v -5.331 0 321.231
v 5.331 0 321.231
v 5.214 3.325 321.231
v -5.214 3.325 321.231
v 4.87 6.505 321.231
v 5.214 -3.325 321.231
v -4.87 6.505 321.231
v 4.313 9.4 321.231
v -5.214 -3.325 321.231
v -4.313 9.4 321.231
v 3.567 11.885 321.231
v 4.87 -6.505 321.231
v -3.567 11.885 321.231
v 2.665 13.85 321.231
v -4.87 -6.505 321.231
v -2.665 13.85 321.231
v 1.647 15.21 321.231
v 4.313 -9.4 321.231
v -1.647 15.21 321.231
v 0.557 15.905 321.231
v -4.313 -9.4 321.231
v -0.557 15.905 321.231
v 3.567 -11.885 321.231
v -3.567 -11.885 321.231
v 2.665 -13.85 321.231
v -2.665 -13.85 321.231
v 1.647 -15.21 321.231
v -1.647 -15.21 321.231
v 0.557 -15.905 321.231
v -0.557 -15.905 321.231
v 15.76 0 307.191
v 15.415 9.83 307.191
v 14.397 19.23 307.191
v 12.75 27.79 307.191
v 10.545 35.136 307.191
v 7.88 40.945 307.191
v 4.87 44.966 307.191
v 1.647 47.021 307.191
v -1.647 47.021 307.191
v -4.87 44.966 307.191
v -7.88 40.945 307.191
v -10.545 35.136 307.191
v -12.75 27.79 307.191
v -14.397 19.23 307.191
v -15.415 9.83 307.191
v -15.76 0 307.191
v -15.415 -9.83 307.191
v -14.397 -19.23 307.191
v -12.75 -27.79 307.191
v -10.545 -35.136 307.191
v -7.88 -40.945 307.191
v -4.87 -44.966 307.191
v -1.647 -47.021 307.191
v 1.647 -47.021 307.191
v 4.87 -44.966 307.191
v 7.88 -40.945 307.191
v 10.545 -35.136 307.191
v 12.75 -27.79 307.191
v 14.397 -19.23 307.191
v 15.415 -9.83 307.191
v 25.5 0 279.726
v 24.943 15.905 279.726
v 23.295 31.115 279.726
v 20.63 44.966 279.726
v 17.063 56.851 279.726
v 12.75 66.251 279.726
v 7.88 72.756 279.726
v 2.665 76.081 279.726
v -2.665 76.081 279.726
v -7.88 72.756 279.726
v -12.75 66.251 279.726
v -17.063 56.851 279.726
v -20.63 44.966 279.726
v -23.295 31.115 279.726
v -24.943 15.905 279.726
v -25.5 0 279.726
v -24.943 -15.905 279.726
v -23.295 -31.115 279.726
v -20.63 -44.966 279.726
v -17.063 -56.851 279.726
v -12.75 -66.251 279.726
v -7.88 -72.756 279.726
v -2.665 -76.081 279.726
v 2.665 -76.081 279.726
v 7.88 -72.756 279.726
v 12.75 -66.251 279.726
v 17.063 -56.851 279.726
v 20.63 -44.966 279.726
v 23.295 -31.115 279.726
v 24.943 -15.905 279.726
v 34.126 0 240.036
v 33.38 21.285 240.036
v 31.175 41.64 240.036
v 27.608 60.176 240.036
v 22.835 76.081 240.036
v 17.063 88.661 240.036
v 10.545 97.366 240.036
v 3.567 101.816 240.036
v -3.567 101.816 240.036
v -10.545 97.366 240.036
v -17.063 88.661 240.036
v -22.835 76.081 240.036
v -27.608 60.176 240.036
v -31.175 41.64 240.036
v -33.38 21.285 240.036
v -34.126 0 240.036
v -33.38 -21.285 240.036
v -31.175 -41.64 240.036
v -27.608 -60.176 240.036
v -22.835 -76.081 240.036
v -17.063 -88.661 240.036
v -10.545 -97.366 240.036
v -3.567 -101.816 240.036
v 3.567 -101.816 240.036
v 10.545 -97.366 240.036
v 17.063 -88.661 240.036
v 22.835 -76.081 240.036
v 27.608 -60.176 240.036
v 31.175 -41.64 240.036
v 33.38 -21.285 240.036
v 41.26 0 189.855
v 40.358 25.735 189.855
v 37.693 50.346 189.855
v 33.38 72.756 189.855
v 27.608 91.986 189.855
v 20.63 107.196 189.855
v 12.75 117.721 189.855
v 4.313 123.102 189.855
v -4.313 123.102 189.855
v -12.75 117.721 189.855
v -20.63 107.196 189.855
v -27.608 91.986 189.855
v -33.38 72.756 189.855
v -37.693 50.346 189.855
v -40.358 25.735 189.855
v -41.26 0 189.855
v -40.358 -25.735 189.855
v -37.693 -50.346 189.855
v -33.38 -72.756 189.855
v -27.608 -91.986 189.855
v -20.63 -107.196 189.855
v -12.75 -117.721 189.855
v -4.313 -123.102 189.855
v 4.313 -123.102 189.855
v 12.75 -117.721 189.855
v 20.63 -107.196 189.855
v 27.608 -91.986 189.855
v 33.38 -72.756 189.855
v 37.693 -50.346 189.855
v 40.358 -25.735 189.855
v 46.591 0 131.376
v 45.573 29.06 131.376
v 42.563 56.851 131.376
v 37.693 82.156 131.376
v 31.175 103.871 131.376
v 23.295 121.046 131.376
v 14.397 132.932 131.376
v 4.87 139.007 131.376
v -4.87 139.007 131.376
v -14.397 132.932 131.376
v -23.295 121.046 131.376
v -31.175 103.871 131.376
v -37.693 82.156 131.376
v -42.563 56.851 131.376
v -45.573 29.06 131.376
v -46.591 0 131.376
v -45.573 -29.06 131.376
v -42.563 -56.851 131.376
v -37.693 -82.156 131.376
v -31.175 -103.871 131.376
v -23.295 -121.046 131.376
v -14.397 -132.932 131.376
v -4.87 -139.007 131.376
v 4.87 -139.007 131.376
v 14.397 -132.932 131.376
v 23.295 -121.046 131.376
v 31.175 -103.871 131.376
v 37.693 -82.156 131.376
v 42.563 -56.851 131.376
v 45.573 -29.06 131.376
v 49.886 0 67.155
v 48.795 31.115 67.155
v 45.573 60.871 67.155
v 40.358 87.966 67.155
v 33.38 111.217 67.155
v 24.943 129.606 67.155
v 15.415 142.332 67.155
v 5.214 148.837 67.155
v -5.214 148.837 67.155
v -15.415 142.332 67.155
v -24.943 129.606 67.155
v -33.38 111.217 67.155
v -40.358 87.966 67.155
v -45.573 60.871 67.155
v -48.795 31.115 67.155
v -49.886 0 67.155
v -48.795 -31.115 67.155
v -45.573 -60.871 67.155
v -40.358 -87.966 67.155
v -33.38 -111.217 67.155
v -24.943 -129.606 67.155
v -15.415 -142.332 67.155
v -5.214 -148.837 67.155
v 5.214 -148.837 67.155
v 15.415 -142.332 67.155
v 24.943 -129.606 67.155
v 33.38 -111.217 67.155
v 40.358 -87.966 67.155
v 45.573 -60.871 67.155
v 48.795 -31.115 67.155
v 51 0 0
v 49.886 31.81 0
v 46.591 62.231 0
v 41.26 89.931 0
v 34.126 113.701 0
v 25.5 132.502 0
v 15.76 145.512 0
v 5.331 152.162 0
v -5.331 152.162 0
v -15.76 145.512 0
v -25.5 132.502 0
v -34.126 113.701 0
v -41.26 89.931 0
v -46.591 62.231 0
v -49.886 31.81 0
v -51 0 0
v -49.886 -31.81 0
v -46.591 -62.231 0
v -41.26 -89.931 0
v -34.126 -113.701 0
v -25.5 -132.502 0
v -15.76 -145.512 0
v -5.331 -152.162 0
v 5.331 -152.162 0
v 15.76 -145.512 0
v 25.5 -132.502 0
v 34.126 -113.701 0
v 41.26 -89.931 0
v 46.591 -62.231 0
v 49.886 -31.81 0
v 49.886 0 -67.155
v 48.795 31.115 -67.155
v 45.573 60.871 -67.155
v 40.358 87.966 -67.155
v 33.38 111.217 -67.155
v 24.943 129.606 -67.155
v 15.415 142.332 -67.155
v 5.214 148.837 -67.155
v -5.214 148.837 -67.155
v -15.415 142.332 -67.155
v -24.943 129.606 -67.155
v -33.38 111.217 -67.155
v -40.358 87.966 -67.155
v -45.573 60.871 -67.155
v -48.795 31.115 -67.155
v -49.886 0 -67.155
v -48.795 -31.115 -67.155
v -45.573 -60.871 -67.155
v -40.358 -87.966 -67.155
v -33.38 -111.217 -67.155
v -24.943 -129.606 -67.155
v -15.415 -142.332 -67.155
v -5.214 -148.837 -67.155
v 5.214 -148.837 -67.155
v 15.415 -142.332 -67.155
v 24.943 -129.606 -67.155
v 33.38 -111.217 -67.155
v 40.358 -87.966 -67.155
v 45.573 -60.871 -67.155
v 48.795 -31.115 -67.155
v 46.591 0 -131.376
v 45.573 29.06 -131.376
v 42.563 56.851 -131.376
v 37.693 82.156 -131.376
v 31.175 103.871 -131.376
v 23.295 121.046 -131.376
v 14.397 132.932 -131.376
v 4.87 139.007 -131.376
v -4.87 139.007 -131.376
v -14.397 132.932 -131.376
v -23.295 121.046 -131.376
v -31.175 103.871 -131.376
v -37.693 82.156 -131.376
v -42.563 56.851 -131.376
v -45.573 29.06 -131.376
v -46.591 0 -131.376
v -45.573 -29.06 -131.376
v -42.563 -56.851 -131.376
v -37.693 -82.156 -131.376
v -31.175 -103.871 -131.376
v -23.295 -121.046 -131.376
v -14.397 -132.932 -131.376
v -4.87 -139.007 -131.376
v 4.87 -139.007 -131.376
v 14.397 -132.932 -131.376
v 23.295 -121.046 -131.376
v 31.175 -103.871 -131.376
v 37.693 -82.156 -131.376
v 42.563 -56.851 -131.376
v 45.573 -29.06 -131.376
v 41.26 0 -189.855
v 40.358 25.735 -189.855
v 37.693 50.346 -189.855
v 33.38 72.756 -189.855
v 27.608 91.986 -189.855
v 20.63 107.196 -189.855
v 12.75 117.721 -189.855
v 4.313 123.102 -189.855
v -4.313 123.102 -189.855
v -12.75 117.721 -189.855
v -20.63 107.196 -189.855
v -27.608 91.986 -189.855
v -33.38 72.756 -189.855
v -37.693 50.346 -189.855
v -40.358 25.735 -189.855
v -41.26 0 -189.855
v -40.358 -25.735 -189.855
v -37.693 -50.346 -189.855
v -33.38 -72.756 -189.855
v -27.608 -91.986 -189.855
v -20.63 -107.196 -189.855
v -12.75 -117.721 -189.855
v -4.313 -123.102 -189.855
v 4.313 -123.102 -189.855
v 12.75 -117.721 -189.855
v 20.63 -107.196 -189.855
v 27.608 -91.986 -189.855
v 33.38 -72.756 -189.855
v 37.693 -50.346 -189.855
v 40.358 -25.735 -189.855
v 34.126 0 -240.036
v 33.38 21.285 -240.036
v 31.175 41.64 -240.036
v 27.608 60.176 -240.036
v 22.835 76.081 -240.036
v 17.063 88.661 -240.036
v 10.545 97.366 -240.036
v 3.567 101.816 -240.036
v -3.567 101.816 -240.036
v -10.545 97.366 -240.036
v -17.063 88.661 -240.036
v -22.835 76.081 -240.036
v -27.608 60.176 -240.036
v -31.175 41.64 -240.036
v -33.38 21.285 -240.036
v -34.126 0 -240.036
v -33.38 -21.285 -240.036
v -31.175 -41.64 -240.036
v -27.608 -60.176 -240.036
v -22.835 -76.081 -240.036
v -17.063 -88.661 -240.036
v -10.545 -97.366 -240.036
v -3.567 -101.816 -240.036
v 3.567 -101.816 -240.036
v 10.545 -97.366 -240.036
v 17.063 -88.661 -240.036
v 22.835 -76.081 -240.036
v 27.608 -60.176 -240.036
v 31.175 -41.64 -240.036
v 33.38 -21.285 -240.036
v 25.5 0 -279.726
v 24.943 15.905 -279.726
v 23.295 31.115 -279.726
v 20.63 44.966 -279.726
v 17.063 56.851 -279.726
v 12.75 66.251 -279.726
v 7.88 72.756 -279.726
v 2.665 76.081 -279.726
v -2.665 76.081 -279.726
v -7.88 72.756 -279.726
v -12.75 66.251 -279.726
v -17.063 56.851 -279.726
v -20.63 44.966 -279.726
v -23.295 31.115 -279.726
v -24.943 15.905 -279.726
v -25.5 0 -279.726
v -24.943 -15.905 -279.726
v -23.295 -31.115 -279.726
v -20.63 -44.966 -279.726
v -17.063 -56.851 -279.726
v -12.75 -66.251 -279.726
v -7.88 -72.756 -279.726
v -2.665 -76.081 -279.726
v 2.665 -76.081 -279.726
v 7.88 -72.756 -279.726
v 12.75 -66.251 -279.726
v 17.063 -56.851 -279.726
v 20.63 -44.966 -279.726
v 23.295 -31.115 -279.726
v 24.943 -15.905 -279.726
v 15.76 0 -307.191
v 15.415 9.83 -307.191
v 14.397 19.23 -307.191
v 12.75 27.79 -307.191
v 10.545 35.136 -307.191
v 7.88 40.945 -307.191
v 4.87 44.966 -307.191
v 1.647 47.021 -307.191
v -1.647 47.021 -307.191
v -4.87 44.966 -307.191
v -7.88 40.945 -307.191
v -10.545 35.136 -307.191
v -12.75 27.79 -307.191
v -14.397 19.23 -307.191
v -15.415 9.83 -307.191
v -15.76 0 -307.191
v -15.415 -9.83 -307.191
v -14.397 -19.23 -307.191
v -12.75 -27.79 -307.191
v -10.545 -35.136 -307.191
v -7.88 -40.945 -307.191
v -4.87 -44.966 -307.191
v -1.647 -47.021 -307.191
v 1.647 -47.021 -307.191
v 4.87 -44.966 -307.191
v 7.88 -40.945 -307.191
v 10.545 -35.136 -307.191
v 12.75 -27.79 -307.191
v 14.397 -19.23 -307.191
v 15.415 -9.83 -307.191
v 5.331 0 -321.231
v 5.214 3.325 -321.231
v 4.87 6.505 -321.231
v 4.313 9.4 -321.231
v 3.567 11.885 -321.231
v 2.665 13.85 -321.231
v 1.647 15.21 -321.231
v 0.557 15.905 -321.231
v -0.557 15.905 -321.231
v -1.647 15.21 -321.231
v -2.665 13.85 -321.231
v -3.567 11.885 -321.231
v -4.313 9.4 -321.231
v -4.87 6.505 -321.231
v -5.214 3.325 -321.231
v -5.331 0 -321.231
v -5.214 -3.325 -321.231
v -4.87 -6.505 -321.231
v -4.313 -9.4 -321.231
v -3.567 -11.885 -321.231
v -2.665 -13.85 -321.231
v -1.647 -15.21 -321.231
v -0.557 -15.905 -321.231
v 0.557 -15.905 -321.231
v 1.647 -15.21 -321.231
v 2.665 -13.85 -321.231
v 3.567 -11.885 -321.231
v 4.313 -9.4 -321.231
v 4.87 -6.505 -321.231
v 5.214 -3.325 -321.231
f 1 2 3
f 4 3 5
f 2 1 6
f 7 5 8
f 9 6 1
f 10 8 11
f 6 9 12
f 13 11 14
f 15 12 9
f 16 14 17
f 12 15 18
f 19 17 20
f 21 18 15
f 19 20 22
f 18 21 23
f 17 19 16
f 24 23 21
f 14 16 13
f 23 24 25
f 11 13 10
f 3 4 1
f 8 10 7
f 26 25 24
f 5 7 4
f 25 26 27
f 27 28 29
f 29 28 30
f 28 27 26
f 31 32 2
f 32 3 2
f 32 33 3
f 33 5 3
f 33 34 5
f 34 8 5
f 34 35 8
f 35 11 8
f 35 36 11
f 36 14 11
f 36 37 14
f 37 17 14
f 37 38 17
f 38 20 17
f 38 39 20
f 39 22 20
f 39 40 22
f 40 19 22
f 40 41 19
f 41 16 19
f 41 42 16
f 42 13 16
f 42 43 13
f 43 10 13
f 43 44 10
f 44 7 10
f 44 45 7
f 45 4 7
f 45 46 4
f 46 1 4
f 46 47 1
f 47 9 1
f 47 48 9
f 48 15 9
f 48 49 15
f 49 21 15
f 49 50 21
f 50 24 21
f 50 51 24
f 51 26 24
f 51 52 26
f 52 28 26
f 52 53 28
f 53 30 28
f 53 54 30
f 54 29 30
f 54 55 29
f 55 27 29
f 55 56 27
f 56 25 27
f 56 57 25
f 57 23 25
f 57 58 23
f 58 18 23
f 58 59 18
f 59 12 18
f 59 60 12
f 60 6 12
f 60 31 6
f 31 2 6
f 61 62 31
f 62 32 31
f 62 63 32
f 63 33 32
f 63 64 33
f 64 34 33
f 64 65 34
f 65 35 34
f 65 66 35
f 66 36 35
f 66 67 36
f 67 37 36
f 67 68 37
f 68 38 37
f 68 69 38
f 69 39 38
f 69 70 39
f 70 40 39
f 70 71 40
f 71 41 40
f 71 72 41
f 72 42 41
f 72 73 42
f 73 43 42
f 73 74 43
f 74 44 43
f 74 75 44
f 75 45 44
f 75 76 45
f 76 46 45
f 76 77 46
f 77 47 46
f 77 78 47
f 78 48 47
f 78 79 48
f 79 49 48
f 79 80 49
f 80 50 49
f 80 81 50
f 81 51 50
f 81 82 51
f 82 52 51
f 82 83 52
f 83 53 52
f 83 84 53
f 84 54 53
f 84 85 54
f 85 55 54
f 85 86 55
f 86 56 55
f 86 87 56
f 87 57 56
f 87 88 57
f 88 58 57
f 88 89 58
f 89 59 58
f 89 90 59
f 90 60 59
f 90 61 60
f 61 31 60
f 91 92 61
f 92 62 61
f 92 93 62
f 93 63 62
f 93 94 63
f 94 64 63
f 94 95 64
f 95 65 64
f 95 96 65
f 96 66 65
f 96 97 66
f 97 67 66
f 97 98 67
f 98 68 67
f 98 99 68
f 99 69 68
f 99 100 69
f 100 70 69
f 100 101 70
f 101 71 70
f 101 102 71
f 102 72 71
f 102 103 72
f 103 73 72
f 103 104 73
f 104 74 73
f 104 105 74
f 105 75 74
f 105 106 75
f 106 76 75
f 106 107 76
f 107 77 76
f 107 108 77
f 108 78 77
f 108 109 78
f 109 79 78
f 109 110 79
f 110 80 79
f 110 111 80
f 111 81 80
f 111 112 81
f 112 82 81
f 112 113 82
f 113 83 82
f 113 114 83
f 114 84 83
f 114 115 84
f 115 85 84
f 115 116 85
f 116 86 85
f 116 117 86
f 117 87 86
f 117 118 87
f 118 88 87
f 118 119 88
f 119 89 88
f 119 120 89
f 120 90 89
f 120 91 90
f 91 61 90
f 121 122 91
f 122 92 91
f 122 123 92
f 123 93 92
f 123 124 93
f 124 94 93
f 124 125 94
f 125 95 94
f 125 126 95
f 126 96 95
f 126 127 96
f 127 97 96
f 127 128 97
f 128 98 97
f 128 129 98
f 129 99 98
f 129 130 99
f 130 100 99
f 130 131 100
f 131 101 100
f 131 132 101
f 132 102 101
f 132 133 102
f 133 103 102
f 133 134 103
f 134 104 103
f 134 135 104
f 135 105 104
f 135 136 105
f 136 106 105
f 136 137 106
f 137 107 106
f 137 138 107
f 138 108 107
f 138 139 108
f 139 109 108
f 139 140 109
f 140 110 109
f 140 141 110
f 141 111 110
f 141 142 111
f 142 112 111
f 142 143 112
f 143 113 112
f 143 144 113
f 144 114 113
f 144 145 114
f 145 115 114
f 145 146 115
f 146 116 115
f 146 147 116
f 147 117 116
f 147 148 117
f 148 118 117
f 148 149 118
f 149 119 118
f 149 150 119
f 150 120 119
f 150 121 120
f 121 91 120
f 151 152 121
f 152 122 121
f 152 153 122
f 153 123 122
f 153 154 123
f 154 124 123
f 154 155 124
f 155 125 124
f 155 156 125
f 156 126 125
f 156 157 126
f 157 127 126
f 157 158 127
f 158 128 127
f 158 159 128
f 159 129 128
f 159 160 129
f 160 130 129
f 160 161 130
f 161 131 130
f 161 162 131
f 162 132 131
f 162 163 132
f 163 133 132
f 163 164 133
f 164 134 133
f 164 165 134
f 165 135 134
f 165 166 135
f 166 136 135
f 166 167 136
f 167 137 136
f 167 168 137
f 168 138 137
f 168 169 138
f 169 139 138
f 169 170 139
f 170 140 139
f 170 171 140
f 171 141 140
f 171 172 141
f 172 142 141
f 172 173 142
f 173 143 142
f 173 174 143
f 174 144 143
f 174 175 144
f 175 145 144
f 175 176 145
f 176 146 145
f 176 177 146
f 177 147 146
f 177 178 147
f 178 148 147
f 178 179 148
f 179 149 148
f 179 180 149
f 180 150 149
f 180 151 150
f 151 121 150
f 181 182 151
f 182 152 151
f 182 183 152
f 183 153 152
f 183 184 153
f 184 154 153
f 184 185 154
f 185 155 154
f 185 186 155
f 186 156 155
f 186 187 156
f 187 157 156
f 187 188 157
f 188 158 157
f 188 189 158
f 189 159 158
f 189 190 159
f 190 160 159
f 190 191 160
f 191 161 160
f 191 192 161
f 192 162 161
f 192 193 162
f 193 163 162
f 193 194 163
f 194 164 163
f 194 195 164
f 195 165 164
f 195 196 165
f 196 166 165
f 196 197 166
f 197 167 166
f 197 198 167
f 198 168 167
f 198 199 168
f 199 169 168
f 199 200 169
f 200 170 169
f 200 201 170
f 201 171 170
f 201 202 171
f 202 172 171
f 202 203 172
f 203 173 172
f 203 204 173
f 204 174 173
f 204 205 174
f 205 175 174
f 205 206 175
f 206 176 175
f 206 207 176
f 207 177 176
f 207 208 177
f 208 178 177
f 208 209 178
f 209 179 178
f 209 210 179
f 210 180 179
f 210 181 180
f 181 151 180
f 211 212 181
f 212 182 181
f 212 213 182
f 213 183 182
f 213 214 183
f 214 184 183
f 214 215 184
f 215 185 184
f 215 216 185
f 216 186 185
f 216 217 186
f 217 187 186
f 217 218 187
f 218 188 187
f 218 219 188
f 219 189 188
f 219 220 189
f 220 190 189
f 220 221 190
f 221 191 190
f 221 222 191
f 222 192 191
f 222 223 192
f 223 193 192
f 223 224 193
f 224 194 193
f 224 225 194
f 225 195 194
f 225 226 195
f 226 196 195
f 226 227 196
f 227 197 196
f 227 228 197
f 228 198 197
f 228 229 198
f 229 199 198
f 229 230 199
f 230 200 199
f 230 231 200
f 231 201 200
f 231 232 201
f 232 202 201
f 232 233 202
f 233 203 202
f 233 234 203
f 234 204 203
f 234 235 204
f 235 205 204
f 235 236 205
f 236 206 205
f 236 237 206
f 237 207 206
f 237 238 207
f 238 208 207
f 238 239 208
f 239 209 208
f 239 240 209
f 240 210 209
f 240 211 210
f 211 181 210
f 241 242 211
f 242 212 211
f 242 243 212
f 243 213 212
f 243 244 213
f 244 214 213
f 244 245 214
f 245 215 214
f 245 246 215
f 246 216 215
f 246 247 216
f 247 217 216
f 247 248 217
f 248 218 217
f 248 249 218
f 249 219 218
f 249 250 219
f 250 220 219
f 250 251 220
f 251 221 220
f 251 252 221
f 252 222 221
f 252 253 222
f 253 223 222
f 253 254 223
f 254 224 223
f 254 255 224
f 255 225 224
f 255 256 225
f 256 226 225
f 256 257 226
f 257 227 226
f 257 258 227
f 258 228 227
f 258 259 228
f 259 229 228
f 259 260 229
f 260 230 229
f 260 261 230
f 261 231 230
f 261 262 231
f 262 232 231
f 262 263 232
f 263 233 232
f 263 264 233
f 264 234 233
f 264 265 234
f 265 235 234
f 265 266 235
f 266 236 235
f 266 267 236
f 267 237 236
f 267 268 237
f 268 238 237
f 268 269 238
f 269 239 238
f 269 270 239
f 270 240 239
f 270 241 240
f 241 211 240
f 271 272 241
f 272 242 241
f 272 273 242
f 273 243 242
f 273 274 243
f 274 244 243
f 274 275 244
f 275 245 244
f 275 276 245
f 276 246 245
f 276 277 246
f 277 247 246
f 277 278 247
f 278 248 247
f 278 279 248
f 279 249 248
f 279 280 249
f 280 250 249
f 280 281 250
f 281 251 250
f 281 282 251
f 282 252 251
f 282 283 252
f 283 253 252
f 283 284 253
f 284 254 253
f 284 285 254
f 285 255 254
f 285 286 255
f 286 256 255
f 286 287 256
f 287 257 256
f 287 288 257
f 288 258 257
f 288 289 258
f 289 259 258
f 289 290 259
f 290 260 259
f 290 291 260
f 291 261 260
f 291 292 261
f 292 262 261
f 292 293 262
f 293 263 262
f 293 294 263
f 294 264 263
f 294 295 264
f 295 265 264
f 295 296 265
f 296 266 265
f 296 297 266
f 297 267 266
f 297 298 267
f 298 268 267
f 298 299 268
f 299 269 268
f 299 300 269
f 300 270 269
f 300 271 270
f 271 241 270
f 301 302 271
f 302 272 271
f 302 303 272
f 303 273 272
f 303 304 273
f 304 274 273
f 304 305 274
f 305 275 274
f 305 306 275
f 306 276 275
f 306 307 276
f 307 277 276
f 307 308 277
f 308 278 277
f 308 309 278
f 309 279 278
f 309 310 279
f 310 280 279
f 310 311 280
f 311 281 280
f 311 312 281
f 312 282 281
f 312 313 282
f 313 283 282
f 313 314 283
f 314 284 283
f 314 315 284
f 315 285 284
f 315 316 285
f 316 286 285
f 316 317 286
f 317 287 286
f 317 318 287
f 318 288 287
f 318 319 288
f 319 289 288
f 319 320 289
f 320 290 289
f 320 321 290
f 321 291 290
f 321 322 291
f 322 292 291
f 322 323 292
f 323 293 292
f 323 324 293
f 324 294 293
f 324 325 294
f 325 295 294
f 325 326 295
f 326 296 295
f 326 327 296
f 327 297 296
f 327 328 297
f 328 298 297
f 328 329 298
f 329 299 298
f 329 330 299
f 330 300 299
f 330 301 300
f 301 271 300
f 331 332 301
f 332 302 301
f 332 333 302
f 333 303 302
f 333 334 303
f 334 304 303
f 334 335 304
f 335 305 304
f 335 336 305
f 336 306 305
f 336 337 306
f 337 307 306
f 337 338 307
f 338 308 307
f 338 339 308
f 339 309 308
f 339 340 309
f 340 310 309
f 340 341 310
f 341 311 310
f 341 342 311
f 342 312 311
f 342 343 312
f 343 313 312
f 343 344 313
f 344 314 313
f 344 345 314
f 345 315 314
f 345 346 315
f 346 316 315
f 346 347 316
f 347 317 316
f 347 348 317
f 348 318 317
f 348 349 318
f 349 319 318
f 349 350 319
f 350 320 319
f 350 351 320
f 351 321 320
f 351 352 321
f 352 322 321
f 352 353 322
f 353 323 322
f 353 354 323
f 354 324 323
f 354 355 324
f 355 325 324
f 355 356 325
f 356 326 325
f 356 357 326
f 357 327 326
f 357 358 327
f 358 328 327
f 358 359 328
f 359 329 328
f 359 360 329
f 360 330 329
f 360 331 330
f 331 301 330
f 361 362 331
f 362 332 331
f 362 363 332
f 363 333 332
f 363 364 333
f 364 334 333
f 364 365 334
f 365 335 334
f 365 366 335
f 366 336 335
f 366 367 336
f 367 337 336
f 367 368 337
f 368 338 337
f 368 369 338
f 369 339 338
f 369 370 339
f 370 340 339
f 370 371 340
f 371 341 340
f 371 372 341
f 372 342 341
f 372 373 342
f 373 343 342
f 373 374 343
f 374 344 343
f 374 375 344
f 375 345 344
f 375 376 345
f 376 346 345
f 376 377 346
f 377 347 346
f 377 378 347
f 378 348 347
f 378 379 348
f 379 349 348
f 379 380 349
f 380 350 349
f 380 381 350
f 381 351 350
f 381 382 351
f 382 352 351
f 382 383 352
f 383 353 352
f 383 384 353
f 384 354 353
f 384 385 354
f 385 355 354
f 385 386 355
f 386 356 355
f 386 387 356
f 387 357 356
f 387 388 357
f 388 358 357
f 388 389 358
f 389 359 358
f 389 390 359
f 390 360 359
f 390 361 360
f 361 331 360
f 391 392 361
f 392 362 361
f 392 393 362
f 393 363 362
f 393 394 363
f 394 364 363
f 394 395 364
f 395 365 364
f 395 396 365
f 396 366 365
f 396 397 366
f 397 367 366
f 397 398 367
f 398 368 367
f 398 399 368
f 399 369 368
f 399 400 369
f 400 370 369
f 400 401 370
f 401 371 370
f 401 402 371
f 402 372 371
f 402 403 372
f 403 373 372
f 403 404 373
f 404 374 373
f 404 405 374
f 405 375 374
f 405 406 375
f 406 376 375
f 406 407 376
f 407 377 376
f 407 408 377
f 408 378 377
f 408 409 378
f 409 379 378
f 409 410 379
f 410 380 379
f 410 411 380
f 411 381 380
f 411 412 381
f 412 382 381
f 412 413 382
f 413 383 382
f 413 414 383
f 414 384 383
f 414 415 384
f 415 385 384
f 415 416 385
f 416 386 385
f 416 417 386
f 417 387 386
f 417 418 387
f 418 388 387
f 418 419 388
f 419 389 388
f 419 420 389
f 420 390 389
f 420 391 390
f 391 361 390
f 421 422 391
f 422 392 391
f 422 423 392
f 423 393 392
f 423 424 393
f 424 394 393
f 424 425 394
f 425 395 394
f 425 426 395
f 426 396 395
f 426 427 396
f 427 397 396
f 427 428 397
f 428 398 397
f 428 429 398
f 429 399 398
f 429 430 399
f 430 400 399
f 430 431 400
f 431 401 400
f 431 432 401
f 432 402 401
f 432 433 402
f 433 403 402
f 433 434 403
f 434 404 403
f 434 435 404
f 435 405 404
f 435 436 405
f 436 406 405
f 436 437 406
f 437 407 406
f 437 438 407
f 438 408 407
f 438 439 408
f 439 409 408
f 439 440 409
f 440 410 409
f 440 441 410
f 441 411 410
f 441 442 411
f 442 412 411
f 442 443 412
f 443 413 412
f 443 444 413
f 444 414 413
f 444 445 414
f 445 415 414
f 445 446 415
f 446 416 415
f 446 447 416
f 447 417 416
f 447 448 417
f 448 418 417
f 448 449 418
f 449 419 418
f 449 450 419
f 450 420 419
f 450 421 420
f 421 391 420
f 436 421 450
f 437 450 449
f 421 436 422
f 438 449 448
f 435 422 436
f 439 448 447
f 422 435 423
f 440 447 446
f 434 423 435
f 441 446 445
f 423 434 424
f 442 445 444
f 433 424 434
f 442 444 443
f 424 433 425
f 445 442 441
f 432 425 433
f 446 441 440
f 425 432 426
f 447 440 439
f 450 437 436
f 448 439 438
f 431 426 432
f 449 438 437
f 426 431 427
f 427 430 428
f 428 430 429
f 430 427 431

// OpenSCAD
// Generated by SolidPython 1.0.1 on 2020-07-29 00:46:45


scale(v = [3, 9, 19]) {
	sphere(r = 17);
}
/***********************************************
*********      SolidPython code:      **********
************************************************
 
# import packages: SolidPython
from solid import *
from solid.utils import *
from itertools import chain, combinations, permutations


class Resize:

    def __init__(self, scad_file):
        self.scad_file = scad_file
        #self.scad_file = import_scad(scad_file)
        # cone/cylinder param:
        self.r1 = 0
        self.r2 = 0
        self.h = 0
        # rectangular prism param:
        self.w = 0
        self.l = 0
        # ellipse param:
        self.r = 0

    # import OpenScad code (file name corresponds to shape)


    # classify shape + parameters
    def assign(self, param1, param2, param3):
        if self.scad_file == 'cone.scad':
            self.r1 = param1
            self.r2 = param2
            self.h = param3
        elif self.scad_file == 'cylinder.scad':
            self.r1 = param1
            self.r2 = param2
            self.h = param3
        elif self.scad_file == 'rectangularPrism.scad':
            self.h = param1
            self.l = param2
            self.w = param3
        else:
            self.r = param1
            self.h = param2

    # resize parameters
    def iterate(self):
        x = range(3, 20, 2)
        i = 1
        if self.scad_file == 'cone.scad':
            tempList = list(permutations(x, 2))
            for temp in tempList:
                param1 = temp[0]
                param2 = temp[1]
                filepath = 'produced_scad_files/' + 'cone' + str(param1) + '_' + str(param2) + '_' + '.scad'
                scad_render_to_file(cylinder(h=param1, r1=param2, r2=0), filepath)

        elif self.scad_file == 'cylinder.scad':
            tempList = list(permutations(x, 3))
            for temp in tempList:
                param1 = temp[0]
                param2 = temp[1]
                filepath = 'produced_scad_files/' + 'cylinder' + str(param1) + '_' + str(param2) + '_' + '.scad'
                scad_render_to_file(cylinder(h=param1, r1=param2, r2=param2), filepath)

        elif self.scad_file == 'rectangularPrism.scad':
            tempList = list(permutations(x, 3))
            for temp in tempList:
                param1 = temp[0]
                param2 = temp[1]
                param3 = temp[2]
                filepath = 'produced_scad_files/' + 'rectangularPrism' + str(param1) + '_' + str(param2) + '_' + str(
                    param3) + '.scad'
                scad_render_to_file(cube(size=(param1, param2, param3)), filepath)

        elif self.scad_file == 'ellipse.scad':
            tempList = list(permutations(x, 4))
            for temp in tempList:
                param1 = temp[0]
                param2 = temp[1]
                param3 = temp[2]
                param4 = temp[3]
                filepath = 'produced_scad_files/' + 'ellipse' + str(param1) + '_' + str(param2) + '_' + str(param3) + '_' + str(param4) + '.scad'
                scad_render_to_file(scale([param1, param2, param3])(sphere(r=param4)), filepath)

    def render_to_scadfile(self):
        scad_render_to_file(scad, 'example.scad') 
 
************************************************/
